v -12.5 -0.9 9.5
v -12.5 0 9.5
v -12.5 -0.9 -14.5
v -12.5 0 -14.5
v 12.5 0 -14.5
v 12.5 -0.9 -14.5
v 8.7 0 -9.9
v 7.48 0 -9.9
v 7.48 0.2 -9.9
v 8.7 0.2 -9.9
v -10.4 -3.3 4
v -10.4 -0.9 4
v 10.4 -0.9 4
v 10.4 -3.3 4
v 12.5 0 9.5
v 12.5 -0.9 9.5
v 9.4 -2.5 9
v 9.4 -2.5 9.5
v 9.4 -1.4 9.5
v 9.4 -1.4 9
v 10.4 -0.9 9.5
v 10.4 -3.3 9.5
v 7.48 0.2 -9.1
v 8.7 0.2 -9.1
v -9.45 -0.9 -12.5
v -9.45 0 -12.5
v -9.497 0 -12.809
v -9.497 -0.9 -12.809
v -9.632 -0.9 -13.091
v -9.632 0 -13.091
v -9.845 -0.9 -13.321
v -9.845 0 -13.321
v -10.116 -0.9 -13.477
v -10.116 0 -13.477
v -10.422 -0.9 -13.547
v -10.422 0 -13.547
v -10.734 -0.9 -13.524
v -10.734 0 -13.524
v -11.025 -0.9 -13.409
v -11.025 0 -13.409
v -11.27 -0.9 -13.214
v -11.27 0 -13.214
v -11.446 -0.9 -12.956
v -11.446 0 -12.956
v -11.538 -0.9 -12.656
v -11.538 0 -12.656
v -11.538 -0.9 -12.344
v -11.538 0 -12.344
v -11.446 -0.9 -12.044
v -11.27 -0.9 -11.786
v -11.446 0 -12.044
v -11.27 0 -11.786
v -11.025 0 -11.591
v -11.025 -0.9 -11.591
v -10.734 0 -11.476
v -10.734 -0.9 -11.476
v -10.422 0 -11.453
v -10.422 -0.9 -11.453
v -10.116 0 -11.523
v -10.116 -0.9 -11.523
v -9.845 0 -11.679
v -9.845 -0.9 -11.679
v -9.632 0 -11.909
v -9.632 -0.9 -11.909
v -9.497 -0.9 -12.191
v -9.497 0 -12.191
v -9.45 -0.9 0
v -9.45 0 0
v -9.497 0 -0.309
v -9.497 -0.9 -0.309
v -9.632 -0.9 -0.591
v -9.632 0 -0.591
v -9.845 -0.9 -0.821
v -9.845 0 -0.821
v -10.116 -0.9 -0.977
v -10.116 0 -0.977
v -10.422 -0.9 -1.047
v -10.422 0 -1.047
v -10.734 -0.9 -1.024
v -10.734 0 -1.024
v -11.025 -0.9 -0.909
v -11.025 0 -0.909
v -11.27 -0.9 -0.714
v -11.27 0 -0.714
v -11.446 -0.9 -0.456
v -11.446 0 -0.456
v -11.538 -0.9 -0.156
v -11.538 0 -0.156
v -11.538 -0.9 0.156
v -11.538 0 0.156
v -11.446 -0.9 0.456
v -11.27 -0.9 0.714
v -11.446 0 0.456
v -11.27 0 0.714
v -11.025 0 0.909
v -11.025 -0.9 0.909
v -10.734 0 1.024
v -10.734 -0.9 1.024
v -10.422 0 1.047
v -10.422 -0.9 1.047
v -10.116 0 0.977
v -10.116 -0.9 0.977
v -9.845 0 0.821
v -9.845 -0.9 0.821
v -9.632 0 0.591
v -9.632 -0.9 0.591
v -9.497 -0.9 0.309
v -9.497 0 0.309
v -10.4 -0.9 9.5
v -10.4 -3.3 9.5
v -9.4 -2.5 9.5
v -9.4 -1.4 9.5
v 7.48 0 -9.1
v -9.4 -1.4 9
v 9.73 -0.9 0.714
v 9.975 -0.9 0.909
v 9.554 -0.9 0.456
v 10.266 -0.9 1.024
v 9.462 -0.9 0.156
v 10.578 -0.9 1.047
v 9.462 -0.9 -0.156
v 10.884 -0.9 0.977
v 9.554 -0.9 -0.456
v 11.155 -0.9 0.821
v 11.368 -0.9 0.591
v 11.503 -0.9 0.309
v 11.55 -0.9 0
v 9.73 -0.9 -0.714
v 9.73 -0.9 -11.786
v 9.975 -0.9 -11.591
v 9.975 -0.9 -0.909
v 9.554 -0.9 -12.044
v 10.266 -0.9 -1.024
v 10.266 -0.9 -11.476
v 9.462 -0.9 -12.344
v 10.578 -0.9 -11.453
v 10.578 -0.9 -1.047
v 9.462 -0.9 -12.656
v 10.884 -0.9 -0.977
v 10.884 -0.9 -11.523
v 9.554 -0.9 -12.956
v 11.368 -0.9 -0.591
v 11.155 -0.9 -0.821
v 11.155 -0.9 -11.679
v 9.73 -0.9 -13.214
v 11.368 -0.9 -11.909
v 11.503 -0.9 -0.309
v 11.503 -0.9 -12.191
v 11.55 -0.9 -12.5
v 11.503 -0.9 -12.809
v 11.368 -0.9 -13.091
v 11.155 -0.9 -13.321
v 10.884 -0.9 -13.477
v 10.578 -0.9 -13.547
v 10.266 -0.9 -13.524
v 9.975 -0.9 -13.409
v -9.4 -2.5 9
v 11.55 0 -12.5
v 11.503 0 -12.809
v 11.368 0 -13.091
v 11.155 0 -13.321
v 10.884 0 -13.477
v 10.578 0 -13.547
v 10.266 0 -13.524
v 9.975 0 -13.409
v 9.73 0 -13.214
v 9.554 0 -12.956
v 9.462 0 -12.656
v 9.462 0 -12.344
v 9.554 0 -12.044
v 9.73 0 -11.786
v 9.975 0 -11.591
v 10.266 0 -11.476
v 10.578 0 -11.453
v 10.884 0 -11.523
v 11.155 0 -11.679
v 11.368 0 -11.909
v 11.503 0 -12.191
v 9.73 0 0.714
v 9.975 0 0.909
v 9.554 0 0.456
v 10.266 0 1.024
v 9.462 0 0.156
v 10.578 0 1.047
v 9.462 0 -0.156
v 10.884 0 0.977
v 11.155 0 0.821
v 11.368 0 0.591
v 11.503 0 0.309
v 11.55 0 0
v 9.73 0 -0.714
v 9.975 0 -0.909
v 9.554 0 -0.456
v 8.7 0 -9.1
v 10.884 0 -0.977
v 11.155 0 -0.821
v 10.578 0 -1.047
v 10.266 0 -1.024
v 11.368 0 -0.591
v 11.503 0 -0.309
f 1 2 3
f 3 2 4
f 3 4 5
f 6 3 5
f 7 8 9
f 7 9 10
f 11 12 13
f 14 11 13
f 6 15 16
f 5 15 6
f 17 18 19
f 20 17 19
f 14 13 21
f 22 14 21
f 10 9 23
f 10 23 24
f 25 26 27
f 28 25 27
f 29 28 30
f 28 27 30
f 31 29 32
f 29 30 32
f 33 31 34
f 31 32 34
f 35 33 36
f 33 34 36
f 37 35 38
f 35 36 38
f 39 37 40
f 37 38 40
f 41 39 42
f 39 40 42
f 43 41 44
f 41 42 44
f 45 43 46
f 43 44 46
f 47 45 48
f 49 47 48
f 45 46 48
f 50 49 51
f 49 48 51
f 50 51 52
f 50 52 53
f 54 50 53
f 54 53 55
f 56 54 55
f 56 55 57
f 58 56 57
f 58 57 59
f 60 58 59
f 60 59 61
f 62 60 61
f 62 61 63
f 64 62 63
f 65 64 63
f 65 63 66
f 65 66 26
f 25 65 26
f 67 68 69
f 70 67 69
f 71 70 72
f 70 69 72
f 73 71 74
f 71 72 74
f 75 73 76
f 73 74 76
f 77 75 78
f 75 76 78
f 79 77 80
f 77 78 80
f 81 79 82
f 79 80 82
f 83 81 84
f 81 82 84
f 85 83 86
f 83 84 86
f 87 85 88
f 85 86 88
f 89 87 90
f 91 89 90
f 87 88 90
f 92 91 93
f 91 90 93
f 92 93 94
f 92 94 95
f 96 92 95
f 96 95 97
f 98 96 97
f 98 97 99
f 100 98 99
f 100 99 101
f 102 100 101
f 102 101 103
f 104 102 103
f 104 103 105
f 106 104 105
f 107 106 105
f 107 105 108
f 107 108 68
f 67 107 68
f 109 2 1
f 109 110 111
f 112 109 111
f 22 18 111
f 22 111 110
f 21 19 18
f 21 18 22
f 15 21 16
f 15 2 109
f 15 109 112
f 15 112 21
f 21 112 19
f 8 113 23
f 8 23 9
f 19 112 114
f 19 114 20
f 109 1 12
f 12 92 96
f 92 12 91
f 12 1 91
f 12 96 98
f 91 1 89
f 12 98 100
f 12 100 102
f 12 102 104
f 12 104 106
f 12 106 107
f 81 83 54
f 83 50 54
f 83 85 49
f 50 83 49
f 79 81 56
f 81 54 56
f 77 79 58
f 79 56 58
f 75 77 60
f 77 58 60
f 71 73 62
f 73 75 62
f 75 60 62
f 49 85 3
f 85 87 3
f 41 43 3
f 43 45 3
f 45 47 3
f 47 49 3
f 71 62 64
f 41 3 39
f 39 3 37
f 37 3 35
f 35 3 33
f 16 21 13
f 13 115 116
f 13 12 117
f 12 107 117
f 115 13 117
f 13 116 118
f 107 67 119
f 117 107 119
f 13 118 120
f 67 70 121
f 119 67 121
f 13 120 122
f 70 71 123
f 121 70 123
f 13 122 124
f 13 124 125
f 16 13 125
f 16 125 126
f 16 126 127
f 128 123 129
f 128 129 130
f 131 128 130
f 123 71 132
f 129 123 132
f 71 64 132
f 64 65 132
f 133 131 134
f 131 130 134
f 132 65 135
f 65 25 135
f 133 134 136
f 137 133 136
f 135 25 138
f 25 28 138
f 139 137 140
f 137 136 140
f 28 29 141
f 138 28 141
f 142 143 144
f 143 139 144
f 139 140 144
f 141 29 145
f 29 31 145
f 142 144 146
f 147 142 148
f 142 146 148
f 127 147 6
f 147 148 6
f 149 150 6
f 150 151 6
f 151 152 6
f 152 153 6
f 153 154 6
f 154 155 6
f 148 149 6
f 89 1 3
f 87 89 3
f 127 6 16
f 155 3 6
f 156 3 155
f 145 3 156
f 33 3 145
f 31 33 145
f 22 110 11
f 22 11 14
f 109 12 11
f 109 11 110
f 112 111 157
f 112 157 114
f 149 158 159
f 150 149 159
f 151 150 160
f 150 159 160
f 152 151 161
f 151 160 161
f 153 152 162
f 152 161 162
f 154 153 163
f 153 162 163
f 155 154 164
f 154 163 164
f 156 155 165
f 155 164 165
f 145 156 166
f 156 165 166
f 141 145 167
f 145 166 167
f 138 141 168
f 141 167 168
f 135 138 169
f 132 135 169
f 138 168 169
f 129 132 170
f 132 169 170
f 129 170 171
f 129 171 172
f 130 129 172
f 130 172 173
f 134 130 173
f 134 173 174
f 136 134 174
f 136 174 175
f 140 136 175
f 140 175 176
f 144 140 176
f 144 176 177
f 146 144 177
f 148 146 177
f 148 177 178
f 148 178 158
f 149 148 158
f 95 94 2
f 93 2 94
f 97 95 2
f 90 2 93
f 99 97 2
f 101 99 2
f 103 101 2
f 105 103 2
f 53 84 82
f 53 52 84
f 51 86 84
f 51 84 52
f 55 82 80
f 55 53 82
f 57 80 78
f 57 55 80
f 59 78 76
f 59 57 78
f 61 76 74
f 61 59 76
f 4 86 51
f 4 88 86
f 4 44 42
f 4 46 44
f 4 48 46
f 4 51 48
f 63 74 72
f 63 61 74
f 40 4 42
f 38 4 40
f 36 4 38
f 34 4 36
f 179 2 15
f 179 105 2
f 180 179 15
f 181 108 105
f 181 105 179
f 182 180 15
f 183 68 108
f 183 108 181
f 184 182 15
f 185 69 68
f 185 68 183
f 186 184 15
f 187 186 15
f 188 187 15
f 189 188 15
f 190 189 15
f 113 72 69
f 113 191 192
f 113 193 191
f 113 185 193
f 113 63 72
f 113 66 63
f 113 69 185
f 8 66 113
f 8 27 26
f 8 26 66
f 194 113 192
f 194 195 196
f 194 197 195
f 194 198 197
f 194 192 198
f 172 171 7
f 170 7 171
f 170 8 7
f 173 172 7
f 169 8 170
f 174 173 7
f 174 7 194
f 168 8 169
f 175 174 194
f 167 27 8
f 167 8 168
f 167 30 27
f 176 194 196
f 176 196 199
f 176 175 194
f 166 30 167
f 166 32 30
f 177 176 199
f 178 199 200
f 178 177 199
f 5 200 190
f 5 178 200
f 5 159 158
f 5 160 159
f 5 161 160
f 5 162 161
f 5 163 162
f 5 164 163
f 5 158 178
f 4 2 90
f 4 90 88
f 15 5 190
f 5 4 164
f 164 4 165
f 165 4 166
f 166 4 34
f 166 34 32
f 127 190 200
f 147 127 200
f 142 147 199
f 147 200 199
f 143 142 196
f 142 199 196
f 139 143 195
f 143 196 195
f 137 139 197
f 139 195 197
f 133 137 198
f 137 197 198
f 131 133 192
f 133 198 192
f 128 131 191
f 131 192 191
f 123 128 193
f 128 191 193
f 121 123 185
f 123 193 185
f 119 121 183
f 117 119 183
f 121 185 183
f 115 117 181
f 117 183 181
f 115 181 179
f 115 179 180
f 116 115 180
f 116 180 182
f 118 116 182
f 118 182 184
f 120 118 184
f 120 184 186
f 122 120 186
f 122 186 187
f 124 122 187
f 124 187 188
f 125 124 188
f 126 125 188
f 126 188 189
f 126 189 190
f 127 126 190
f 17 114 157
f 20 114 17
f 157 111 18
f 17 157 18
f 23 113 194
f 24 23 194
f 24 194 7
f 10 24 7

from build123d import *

# Parameters (mm, degrees)
SKIZZE1_W               = 25
SKIZZE1_H               = 24
PCB_DEPTH               = 0.9
SKIZZE2_R               = 1.05
MOUNTING_HOLES_DEPTH    = 1.9
SKIZZE3_W               = 20.8
SKIZZE3_H               = 5.5
CONNECTOR_CLOSED_DEPTH  = 2.4
ESQUISSE1_W             = 1.22
ESQUISSE1_H             = 0.8
STATUS_LED_DEPTH        = 0.2
ESQUISSE3_W             = 18.8
ESQUISSE3_H             = 1.1
ENL_V_MAT_EXTRU_1_DEPTH = 0.5


with BuildPart() as part:
    # Skizze1 → PCB (new body)
    with BuildSketch(Plane(origin=(0, 0, 0), x_dir=(1, 0, 0), z_dir=(0, 1, 0))):
        with Locations((0, 2.5)):
            Rectangle(SKIZZE1_W, SKIZZE1_H)
    extrude(amount=-PCB_DEPTH)

    # Skizze2 → Mounting_Holes (cut, through all)
    with BuildSketch(Plane(origin=(0, 0, 0), x_dir=(1, 0, 0), z_dir=(0, 1, 0))):
        with Locations((10.5, 12.5)):
            Circle(SKIZZE2_R)
        with Locations((10.5, 0)):
            Circle(SKIZZE2_R)
        with Locations((-10.5, 0)):
            Circle(SKIZZE2_R)
        with Locations((-10.5, 12.5)):
            Circle(SKIZZE2_R)
    extrude(amount=-MOUNTING_HOLES_DEPTH, mode=Mode.SUBTRACT)

    # Skizze3 → Connector_closed (add)
    with BuildSketch(Plane.XZ.offset(0.9)):
        with Locations((0, 6.75)):
            Rectangle(SKIZZE3_W, SKIZZE3_H)
    extrude(amount=CONNECTOR_CLOSED_DEPTH)

    # Esquisse1 → Status LED (add)
    with BuildSketch(Plane(origin=(0, 0, 0), x_dir=(1, 0, 0), z_dir=(0, 1, 0))):
        with Locations((8.09, 9.5)):
            Rectangle(ESQUISSE1_W, ESQUISSE1_H)
    extrude(amount=STATUS_LED_DEPTH)

    # Esquisse3 → Enlèv. mat.-Extru.1 (cut)
    with BuildSketch(Plane.XY.offset(9.5)):
        with Locations((0, -1.95)):
            Rectangle(ESQUISSE3_W, ESQUISSE3_H)
    extrude(amount=-ENL_V_MAT_EXTRU_1_DEPTH, mode=Mode.SUBTRACT)


solid = part.part
